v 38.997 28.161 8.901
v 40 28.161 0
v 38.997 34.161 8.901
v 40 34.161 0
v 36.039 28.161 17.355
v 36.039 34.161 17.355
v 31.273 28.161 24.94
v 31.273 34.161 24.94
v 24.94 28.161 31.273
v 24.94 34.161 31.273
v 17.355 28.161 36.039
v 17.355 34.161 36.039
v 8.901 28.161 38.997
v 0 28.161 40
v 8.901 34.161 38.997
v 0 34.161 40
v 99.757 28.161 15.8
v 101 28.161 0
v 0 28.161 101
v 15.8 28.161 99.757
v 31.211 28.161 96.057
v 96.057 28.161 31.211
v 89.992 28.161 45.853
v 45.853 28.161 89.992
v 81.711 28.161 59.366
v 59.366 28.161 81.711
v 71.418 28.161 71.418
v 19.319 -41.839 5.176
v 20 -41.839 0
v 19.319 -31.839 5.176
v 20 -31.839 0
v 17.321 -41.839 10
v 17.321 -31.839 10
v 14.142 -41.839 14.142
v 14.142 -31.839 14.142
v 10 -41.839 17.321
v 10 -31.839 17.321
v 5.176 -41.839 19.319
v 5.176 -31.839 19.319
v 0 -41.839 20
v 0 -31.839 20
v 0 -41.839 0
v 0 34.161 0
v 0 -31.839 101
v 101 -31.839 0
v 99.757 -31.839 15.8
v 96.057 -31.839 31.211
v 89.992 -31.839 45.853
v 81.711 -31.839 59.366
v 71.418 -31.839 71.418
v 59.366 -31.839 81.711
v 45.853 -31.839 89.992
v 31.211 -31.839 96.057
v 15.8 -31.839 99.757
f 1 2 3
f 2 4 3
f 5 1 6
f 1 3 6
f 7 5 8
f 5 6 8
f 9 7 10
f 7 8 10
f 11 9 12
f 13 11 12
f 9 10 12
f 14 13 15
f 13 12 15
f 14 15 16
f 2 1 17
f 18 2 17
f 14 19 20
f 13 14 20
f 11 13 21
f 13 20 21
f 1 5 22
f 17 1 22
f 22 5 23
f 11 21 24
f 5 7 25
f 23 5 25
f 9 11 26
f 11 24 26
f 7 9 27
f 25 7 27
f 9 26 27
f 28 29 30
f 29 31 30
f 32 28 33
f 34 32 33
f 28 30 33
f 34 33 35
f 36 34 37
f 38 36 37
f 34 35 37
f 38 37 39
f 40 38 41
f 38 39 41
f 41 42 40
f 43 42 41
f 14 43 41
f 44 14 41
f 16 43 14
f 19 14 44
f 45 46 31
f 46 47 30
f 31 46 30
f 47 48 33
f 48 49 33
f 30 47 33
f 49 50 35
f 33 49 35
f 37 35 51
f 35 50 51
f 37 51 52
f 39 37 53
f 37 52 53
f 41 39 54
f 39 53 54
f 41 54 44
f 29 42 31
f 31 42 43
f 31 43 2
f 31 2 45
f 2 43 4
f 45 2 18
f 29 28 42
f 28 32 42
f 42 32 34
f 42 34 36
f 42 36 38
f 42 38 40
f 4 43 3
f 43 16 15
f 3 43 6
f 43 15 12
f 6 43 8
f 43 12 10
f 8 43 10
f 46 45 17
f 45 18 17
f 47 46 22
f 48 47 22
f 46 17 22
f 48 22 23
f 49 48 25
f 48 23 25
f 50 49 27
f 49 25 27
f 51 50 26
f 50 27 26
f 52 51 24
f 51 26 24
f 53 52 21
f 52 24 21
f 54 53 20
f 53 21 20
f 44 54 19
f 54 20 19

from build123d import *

# Parameters (mm, degrees)
SKETCH1_W      = 30
SKETCH1_H      = 40
SKETCH1_W_2    = 50
REVOLVE8_ANGLE = 90


with BuildPart() as part:
    # Sketch1 → Revolve8 (revolve)
    with BuildSketch(Plane.XY):
        Polygon((40, 34.160621762), (0, 34.160621762), (0, -41.839378238), (20, -41.839378238), (20, -31.839378238), (20, 29.160621762), (40, 29.160621762), align=None)
        Polygon((40, 28.160621762), (40, 29.160621762), (20, 29.160621762), (20, -31.839378238), (21, -31.839378238), (21, -21.839378238), (21, 18.160621762), (21, 28.160621762), align=None)
        Polygon((101, 28.160621762), (40, 28.160621762), (21, 28.160621762), (21, 18.160621762), (51, 18.160621762), (101, 18.160621762), align=None)
        Polygon((21, -21.839378238), (21, -31.839378238), (101, -31.839378238), (101, -21.839378238), (51, -21.839378238), align=None)
        with Locations((36, -1.839378238)):
            Rectangle(SKETCH1_W, SKETCH1_H)
        with Locations((76, -1.839378238)):
            Rectangle(SKETCH1_W_2, SKETCH1_H)
    revolve(axis=Axis((0, 34.160621762, 0), (0, -1, 0)), revolution_arc=REVOLVE8_ANGLE)


solid = part.part
